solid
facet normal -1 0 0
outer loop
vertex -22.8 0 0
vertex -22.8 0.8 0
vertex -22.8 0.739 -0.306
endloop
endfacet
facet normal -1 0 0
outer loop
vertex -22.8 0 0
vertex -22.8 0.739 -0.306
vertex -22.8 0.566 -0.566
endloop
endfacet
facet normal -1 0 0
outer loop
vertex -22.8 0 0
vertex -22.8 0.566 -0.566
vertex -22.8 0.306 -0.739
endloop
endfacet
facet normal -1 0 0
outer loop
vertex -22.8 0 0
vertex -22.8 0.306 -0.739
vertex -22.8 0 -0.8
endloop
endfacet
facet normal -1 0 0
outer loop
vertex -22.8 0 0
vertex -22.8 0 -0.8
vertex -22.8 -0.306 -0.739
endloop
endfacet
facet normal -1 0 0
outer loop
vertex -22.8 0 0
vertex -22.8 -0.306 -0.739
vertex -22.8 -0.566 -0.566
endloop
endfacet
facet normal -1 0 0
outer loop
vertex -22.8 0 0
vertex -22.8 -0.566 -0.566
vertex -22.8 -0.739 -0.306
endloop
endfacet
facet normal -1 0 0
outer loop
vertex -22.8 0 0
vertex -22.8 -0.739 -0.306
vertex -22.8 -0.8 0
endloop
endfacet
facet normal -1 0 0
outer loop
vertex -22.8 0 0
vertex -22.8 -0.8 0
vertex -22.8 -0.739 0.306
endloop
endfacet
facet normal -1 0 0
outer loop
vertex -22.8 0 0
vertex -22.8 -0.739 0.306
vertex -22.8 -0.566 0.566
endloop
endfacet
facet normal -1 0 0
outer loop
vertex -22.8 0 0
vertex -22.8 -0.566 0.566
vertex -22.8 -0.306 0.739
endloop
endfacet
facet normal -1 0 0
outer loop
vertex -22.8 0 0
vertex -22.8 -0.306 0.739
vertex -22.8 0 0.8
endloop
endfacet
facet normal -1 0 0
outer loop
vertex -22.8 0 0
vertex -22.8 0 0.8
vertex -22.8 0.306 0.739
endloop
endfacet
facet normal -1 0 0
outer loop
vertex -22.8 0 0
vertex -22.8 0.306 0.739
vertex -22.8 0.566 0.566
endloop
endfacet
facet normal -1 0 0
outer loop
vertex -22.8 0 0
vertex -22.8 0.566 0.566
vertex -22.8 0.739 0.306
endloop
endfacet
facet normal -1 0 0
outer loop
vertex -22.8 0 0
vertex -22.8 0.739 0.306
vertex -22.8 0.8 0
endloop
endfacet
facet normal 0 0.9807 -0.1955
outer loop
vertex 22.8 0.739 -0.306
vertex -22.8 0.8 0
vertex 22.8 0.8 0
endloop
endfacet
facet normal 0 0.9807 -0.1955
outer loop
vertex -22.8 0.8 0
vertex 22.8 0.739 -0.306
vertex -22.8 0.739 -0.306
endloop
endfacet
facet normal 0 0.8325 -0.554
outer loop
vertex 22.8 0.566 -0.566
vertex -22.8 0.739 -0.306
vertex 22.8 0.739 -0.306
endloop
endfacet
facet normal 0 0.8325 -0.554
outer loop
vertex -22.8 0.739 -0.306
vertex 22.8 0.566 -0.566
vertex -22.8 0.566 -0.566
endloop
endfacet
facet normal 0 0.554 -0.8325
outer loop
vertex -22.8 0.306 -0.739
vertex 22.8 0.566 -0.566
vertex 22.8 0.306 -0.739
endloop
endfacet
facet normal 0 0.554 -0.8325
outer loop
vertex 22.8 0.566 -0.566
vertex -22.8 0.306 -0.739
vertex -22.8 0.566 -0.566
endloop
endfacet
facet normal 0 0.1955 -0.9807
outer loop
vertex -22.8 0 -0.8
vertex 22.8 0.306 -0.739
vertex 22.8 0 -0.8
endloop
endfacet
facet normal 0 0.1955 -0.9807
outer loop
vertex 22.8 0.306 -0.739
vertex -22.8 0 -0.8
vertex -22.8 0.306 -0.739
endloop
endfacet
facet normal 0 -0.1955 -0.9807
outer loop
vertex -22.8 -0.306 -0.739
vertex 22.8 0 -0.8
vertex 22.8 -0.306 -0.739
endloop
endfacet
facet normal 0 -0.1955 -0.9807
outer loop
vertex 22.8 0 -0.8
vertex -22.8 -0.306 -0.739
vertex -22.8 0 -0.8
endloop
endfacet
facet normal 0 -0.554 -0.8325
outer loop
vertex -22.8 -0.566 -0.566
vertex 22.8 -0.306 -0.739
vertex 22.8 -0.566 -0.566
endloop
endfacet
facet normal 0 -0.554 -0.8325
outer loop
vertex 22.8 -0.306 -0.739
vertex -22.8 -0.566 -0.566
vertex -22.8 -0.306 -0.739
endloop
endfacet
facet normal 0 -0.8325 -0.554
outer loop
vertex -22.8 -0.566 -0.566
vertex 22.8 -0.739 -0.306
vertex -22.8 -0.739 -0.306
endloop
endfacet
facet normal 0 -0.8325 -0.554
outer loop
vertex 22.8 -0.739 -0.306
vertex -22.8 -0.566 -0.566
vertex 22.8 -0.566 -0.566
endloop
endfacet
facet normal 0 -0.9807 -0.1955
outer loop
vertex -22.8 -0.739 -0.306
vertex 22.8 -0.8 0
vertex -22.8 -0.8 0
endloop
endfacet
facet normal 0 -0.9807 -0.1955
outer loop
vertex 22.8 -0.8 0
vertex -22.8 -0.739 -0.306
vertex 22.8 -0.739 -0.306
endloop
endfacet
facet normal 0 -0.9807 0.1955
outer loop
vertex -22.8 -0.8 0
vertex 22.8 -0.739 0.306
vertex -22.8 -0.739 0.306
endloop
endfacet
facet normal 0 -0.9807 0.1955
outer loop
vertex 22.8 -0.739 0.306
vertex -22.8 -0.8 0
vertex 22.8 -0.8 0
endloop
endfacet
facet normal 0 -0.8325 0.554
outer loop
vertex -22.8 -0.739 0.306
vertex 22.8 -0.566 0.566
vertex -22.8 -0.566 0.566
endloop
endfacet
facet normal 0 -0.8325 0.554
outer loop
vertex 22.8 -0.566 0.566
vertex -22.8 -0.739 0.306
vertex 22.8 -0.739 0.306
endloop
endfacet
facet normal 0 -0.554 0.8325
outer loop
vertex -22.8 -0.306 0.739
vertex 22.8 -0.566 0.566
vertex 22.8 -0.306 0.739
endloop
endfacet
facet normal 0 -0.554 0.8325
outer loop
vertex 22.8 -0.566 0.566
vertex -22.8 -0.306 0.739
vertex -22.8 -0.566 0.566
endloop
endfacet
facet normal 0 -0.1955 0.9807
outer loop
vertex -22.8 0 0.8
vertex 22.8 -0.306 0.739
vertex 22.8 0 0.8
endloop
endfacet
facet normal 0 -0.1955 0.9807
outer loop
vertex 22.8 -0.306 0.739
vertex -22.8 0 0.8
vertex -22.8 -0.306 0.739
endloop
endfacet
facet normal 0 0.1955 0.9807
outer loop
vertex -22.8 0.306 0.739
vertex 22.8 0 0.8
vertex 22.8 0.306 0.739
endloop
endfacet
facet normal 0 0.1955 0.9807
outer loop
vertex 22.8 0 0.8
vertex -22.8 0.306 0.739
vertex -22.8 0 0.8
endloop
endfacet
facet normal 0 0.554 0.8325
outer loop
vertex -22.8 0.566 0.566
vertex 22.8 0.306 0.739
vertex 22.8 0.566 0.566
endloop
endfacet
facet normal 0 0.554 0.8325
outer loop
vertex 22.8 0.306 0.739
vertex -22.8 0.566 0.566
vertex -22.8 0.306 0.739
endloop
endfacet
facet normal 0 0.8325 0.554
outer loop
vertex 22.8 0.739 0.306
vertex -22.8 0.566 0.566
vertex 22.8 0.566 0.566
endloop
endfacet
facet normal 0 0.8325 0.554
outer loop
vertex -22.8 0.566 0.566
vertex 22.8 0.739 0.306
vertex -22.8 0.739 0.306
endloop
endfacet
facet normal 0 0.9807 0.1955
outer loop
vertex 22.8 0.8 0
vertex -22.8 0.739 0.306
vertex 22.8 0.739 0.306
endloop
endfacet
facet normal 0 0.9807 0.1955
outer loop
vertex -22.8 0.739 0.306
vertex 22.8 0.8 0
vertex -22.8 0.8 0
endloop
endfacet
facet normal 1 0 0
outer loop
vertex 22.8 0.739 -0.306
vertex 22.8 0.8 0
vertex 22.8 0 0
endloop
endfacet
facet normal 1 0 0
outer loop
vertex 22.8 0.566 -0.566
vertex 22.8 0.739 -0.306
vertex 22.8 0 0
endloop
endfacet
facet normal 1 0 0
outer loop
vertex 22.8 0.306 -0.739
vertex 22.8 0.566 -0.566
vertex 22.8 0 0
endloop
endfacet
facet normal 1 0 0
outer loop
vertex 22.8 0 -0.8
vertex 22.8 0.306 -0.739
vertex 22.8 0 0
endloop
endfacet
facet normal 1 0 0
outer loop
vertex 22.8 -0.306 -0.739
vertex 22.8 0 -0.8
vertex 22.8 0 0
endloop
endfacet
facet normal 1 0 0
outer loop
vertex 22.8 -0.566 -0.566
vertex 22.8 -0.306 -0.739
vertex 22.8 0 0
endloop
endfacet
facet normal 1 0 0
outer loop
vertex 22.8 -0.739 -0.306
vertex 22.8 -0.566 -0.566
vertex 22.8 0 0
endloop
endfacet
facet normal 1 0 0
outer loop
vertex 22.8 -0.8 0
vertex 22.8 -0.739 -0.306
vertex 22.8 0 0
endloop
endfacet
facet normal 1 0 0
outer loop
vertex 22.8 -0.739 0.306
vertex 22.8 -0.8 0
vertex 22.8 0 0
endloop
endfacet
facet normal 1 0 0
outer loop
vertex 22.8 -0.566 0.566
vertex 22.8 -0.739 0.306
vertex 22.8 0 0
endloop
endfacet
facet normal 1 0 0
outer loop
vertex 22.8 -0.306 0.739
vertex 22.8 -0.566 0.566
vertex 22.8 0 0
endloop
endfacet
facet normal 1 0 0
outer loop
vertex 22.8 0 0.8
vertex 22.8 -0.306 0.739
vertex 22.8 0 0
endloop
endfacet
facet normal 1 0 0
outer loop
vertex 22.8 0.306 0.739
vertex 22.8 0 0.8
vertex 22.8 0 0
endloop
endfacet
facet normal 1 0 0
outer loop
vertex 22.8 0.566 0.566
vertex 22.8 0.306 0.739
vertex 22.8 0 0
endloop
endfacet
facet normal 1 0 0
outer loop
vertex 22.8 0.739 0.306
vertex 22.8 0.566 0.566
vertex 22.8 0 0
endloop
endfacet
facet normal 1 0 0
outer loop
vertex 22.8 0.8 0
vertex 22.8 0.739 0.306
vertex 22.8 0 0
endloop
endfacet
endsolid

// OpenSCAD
// file: ../p/4-4edge.scad
use <../lib.scad>
function ldraw_lib__4_4edge() = [
// 0 Circle 1.0
// 0 Name: 4-4edge.dat
// 0 Author: James Jessiman
// 0 !LDRAW_ORG Primitive UPDATE 2017-01
// 0 !LICENSE Licensed under CC BY 2.0 and CC BY 4.0 : see CAreadme.txt
// 
// 0 BFC CERTIFY CCW
  [0,"BFC","CERTIFY"],
  [0,"BFC","CCW"],
// 
// 0 !HISTORY 1998-12-15 [PTadmin] Official Update 1998-10
// 0 !HISTORY 2005-12-28 [PTadmin] Official Update 2005-01
// 0 !HISTORY 2007-06-24 [PTadmin] Header formatted for Contributor Agreement
// 0 !HISTORY 2008-07-01 [PTadmin] Official Update 2008-01
// 0 !HISTORY 2017-01-15 [Steffen] BFCed
// 0 !HISTORY 2017-12-30 [PTadmin] Official Update 2017-01
// 
// 
// 2 24 1 0 0 0.9239 0 0.3827
  [2,24,1,0,0,0.9239,0,0.3827],
// 2 24 0.9239 0 0.3827 0.7071 0 0.7071
  [2,24,0.9239,0,0.3827,0.7071,0,0.7071],
// 2 24 0.7071 0 0.7071 0.3827 0 0.9239
  [2,24,0.7071,0,0.7071,0.3827,0,0.9239],
// 2 24 0.3827 0 0.9239 0 0 1
  [2,24,0.3827,0,0.9239,0,0,1],
// 2 24 0 0 1 -0.3827 0 0.9239
  [2,24,0,0,1,-0.3827,0,0.9239],
// 2 24 -0.3827 0 0.9239 -0.7071 0 0.7071
  [2,24,-0.3827,0,0.9239,-0.7071,0,0.7071],
// 2 24 -0.7071 0 0.7071 -0.9239 0 0.3827
  [2,24,-0.7071,0,0.7071,-0.9239,0,0.3827],
// 2 24 -0.9239 0 0.3827 -1 0 -0
  [2,24,-0.9239,0,0.3827,-1,0,-0],
// 2 24 -1 0 -0 -0.9239 0 -0.3827
  [2,24,-1,0,-0,-0.9239,0,-0.3827],
// 2 24 -0.9239 0 -0.3827 -0.7071 0 -0.7071
  [2,24,-0.9239,0,-0.3827,-0.7071,0,-0.7071],
// 2 24 -0.7071 0 -0.7071 -0.3827 0 -0.9239
  [2,24,-0.7071,0,-0.7071,-0.3827,0,-0.9239],
// 2 24 -0.3827 0 -0.9239 0 0 -1
  [2,24,-0.3827,0,-0.9239,0,0,-1],
// 2 24 0 0 -1 0.3827 0 -0.9239
  [2,24,0,0,-1,0.3827,0,-0.9239],
// 2 24 0.3827 0 -0.9239 0.7071 0 -0.7071
  [2,24,0.3827,0,-0.9239,0.7071,0,-0.7071],
// 2 24 0.7071 0 -0.7071 0.9239 0 -0.3827
  [2,24,0.7071,0,-0.7071,0.9239,0,-0.3827],
// 2 24 0.9239 0 -0.3827 1 0 0
  [2,24,0.9239,0,-0.3827,1,0,0],
];
module ldraw_lib__4_4edge(step=0, col=false, unit=2/5, alt=false, line=0.2, solid=!$preview)
    makepoly(ldraw_lib__4_4edge(), step=step, col=col, unit=unit, alt=alt, line=line, solid=solid);
ldraw_lib__4_4edge(line=0.2);
// file: ../p/4-4cyli.scad
use <../lib.scad>
function ldraw_lib__4_4cyli() = [
// 0 Cylinder 1.0
// 0 Name: 4-4cyli.dat
// 0 Author: James Jessiman
// 0 !LDRAW_ORG Primitive UPDATE 2005-01
// 0 !LICENSE Licensed under CC BY 2.0 and CC BY 4.0 : see CAreadme.txt
// 
// 0 BFC CERTIFY CCW
  [0,"BFC","CERTIFY"],
  [0,"BFC","CCW"],
// 
// 0 !HISTORY 1998-12-15 [PTadmin] Official Update 1998-10
// 0 !HISTORY 2002-03-23 [sbliss] Added BFC statement; merged headers from files in distributions LDraw 0.27 and Complete.
// 0 !HISTORY 2002-04-25 [PTadmin] Official Update 2002-02
// 0 !HISTORY 2004-12-14 [guyvivan] BFC CCW
// 0 !HISTORY 2005-12-28 [PTadmin] Official Update 2005-01
// 0 !HISTORY 2007-06-24 [PTadmin] Header formatted for Contributor Agreement
// 0 !HISTORY 2008-07-01 [PTadmin] Official Update 2008-01
// 
// 
// 4 16 1 1 0 0.9239 1 0.3827 0.9239 0 0.3827 1 0 0
  [4,16,1,1,0,0.9239,1,0.3827,0.9239,0,0.3827,1,0,0],
// 5 24 1 0 0 1 1 0 0.9239 0 0.3827 0.9239 0 -0.3827
  [5,24,1,0,0,1,1,0,0.9239,0,0.3827,0.9239,0,-0.3827],
// 4 16 0.9239 1 0.3827 0.7071 1 0.7071 0.7071 0 0.7071 0.9239 0 0.3827
  [4,16,0.9239,1,0.3827,0.7071,1,0.7071,0.7071,0,0.7071,0.9239,0,0.3827],
// 5 24 0.9239 0 0.3827 0.9239 1 0.3827 0.7071 0 0.7071 1 0 0
  [5,24,0.9239,0,0.3827,0.9239,1,0.3827,0.7071,0,0.7071,1,0,0],
// 4 16 0.7071 1 0.7071 0.3827 1 0.9239 0.3827 0 0.9239 0.7071 0 0.7071
  [4,16,0.7071,1,0.7071,0.3827,1,0.9239,0.3827,0,0.9239,0.7071,0,0.7071],
// 5 24 0.7071 0 0.7071 0.7071 1 0.7071 0.3827 0 0.9239 0.9239 0 0.3827
  [5,24,0.7071,0,0.7071,0.7071,1,0.7071,0.3827,0,0.9239,0.9239,0,0.3827],
// 4 16 0.3827 1 0.9239 0 1 1 0 0 1 0.3827 0 0.9239
  [4,16,0.3827,1,0.9239,0,1,1,0,0,1,0.3827,0,0.9239],
// 5 24 0.3827 0 0.9239 0.3827 1 0.9239 0 0 1 0.7071 0 0.7071
  [5,24,0.3827,0,0.9239,0.3827,1,0.9239,0,0,1,0.7071,0,0.7071],
// 4 16 0 1 1 -0.3827 1 0.9239 -0.3827 0 0.9239 0 0 1
  [4,16,0,1,1,-0.3827,1,0.9239,-0.3827,0,0.9239,0,0,1],
// 5 24 0 0 1 0 1 1 -0.3827 0 0.9239 0.3827 0 0.9239
  [5,24,0,0,1,0,1,1,-0.3827,0,0.9239,0.3827,0,0.9239],
// 4 16 -0.3827 1 0.9239 -0.7071 1 0.7071 -0.7071 0 0.7071 -0.3827 0 0.9239
  [4,16,-0.3827,1,0.9239,-0.7071,1,0.7071,-0.7071,0,0.7071,-0.3827,0,0.9239],
// 5 24 -0.3827 0 0.9239 -0.3827 1 0.9239 -0.7071 0 0.7071 0 0 1
  [5,24,-0.3827,0,0.9239,-0.3827,1,0.9239,-0.7071,0,0.7071,0,0,1],
// 4 16 -0.7071 1 0.7071 -0.9239 1 0.3827 -0.9239 0 0.3827 -0.7071 0 0.7071
  [4,16,-0.7071,1,0.7071,-0.9239,1,0.3827,-0.9239,0,0.3827,-0.7071,0,0.7071],
// 5 24 -0.7071 0 0.7071 -0.7071 1 0.7071 -0.9239 0 0.3827 -0.3827 0 0.9239
  [5,24,-0.7071,0,0.7071,-0.7071,1,0.7071,-0.9239,0,0.3827,-0.3827,0,0.9239],
// 4 16 -0.9239 1 0.3827 -1 1 0 -1 0 0 -0.9239 0 0.3827
  [4,16,-0.9239,1,0.3827,-1,1,0,-1,0,0,-0.9239,0,0.3827],
// 5 24 -0.9239 0 0.3827 -0.9239 1 0.3827 -1 0 0 -0.7071 0 0.7071
  [5,24,-0.9239,0,0.3827,-0.9239,1,0.3827,-1,0,0,-0.7071,0,0.7071],
// 4 16 -1 1 0 -0.9239 1 -0.3827 -0.9239 0 -0.3827 -1 0 0
  [4,16,-1,1,0,-0.9239,1,-0.3827,-0.9239,0,-0.3827,-1,0,0],
// 5 24 -1 0 0 -1 1 0 -0.9239 0 -0.3827 -0.9239 0 0.3827
  [5,24,-1,0,0,-1,1,0,-0.9239,0,-0.3827,-0.9239,0,0.3827],
// 4 16 -0.9239 1 -0.3827 -0.7071 1 -0.7071 -0.7071 0 -0.7071 -0.9239 0 -0.3827
  [4,16,-0.9239,1,-0.3827,-0.7071,1,-0.7071,-0.7071,0,-0.7071,-0.9239,0,-0.3827],
// 5 24 -0.9239 0 -0.3827 -0.9239 1 -0.3827 -0.7071 0 -0.7071 -1 0 0
  [5,24,-0.9239,0,-0.3827,-0.9239,1,-0.3827,-0.7071,0,-0.7071,-1,0,0],
// 4 16 -0.7071 1 -0.7071 -0.3827 1 -0.9239 -0.3827 0 -0.9239 -0.7071 0 -0.7071
  [4,16,-0.7071,1,-0.7071,-0.3827,1,-0.9239,-0.3827,0,-0.9239,-0.7071,0,-0.7071],
// 5 24 -0.7071 0 -0.7071 -0.7071 1 -0.7071 -0.3827 0 -0.9239 -0.9239 0 -0.3827
  [5,24,-0.7071,0,-0.7071,-0.7071,1,-0.7071,-0.3827,0,-0.9239,-0.9239,0,-0.3827],
// 4 16 -0.3827 1 -0.9239 0 1 -1 0 0 -1 -0.3827 0 -0.9239
  [4,16,-0.3827,1,-0.9239,0,1,-1,0,0,-1,-0.3827,0,-0.9239],
// 5 24 -0.3827 0 -0.9239 -0.3827 1 -0.9239 0 0 -1 -0.7071 0 -0.7071
  [5,24,-0.3827,0,-0.9239,-0.3827,1,-0.9239,0,0,-1,-0.7071,0,-0.7071],
// 4 16 0 1 -1 0.3827 1 -0.9239 0.3827 0 -0.9239 0 0 -1
  [4,16,0,1,-1,0.3827,1,-0.9239,0.3827,0,-0.9239,0,0,-1],
// 5 24 0 0 -1 0 1 -1 0.3827 0 -0.9239 -0.3827 0 -0.9239
  [5,24,0,0,-1,0,1,-1,0.3827,0,-0.9239,-0.3827,0,-0.9239],
// 4 16 0.3827 1 -0.9239 0.7071 1 -0.7071 0.7071 0 -0.7071 0.3827 0 -0.9239
  [4,16,0.3827,1,-0.9239,0.7071,1,-0.7071,0.7071,0,-0.7071,0.3827,0,-0.9239],
// 5 24 0.3827 0 -0.9239 0.3827 1 -0.9239 0.7071 0 -0.7071 0 0 -1
  [5,24,0.3827,0,-0.9239,0.3827,1,-0.9239,0.7071,0,-0.7071,0,0,-1],
// 4 16 0.7071 1 -0.7071 0.9239 1 -0.3827 0.9239 0 -0.3827 0.7071 0 -0.7071
  [4,16,0.7071,1,-0.7071,0.9239,1,-0.3827,0.9239,0,-0.3827,0.7071,0,-0.7071],
// 5 24 0.7071 0 -0.7071 0.7071 1 -0.7071 0.9239 0 -0.3827 0.3827 0 -0.9239
  [5,24,0.7071,0,-0.7071,0.7071,1,-0.7071,0.9239,0,-0.3827,0.3827,0,-0.9239],
// 4 16 0.9239 1 -0.3827 1 1 0 1 0 0 0.9239 0 -0.3827
  [4,16,0.9239,1,-0.3827,1,1,0,1,0,0,0.9239,0,-0.3827],
// 5 24 0.9239 0 -0.3827 0.9239 1 -0.3827 1 0 0 0.7071 0 -0.7071
  [5,24,0.9239,0,-0.3827,0.9239,1,-0.3827,1,0,0,0.7071,0,-0.7071],
// 0
];
module ldraw_lib__4_4cyli(step=0, col=false, unit=2/5, alt=false, line=0.2, solid=!$preview)
    makepoly(ldraw_lib__4_4cyli(), step=step, col=col, unit=unit, alt=alt, line=line, solid=solid);
ldraw_lib__4_4cyli(line=0.2);
// file: ../p/4-4disc.scad
use <../lib.scad>
function ldraw_lib__4_4disc() = [
// 0 Disc 1.0
// 0 Name: 4-4disc.dat
// 0 Author: James Jessiman
// 0 !LDRAW_ORG Primitive UPDATE 2002-02
// 0 !LICENSE Licensed under CC BY 2.0 and CC BY 4.0 : see CAreadme.txt
// 
// 0 BFC CERTIFY CCW
  [0,"BFC","CERTIFY"],
  [0,"BFC","CCW"],
// 
// 0 !HISTORY 1998-12-15 [PTadmin] Official Update 1998-10
// 0 !HISTORY 2002-03-23 [sbliss] Added BFC statement
// 0 !HISTORY 2002-04-25 [PTadmin] Official Update 2002-02
// 0 !HISTORY 2007-06-24 [PTadmin] Header formatted for Contributor Agreement
// 0 !HISTORY 2008-07-01 [PTadmin] Official Update 2008-01
// 
// 
// 3 16 0 0 0 1 0 0 0.9239 0 0.3827
  [3,16,0,0,0,1,0,0,0.9239,0,0.3827],
// 3 16 0 0 0 0.9239 0 0.3827 0.7071 0 0.7071
  [3,16,0,0,0,0.9239,0,0.3827,0.7071,0,0.7071],
// 3 16 0 0 0 0.7071 0 0.7071 0.3827 0 0.9239
  [3,16,0,0,0,0.7071,0,0.7071,0.3827,0,0.9239],
// 3 16 0 0 0 0.3827 0 0.9239 0 0 1
  [3,16,0,0,0,0.3827,0,0.9239,0,0,1],
// 3 16 0 0 0 0 0 1 -0.3827 0 0.9239
  [3,16,0,0,0,0,0,1,-0.3827,0,0.9239],
// 3 16 0 0 0 -0.3827 0 0.9239 -0.7071 0 0.7071
  [3,16,0,0,0,-0.3827,0,0.9239,-0.7071,0,0.7071],
// 3 16 0 0 0 -0.7071 0 0.7071 -0.9239 0 0.3827
  [3,16,0,0,0,-0.7071,0,0.7071,-0.9239,0,0.3827],
// 3 16 0 0 0 -0.9239 0 0.3827 -1 0 -0
  [3,16,0,0,0,-0.9239,0,0.3827,-1,0,-0],
// 3 16 0 0 0 -1 0 -0 -0.9239 0 -0.3827
  [3,16,0,0,0,-1,0,-0,-0.9239,0,-0.3827],
// 3 16 0 0 0 -0.9239 0 -0.3827 -0.7071 0 -0.7071
  [3,16,0,0,0,-0.9239,0,-0.3827,-0.7071,0,-0.7071],
// 3 16 0 0 0 -0.7071 0 -0.7071 -0.3827 0 -0.9239
  [3,16,0,0,0,-0.7071,0,-0.7071,-0.3827,0,-0.9239],
// 3 16 0 0 0 -0.3827 0 -0.9239 0 0 -1
  [3,16,0,0,0,-0.3827,0,-0.9239,0,0,-1],
// 3 16 0 0 0 0 0 -1 0.3827 0 -0.9239
  [3,16,0,0,0,0,0,-1,0.3827,0,-0.9239],
// 3 16 0 0 0 0.3827 0 -0.9239 0.7071 0 -0.7071
  [3,16,0,0,0,0.3827,0,-0.9239,0.7071,0,-0.7071],
// 3 16 0 0 0 0.7071 0 -0.7071 0.9239 0 -0.3827
  [3,16,0,0,0,0.7071,0,-0.7071,0.9239,0,-0.3827],
// 3 16 0 0 0 0.9239 0 -0.3827 1 0 0
  [3,16,0,0,0,0.9239,0,-0.3827,1,0,0],
// 0
];
module ldraw_lib__4_4disc(step=0, col=false, unit=2/5, alt=false, line=0.2, solid=!$preview)
    makepoly(ldraw_lib__4_4disc(), step=step, col=col, unit=unit, alt=alt, line=line, solid=solid);
ldraw_lib__4_4disc(line=0.2);
// file: ../p/4-4cylc.scad
use <../lib.scad>
use <4-4cyli.scad>
use <4-4disc.scad>
use <4-4edge.scad>
function ldraw_lib__4_4cylc() = [
// 0 Cylinder Closed 1.0
// 0 Name: 4-4cylc.dat
// 0 Author: Alex Taylor [anathema]
// 0 !LDRAW_ORG Primitive UPDATE 2009-02
// 0 !LICENSE Licensed under CC BY 2.0 and CC BY 4.0 : see CAreadme.txt
// 
// 0 BFC CERTIFY CCW
  [0,"BFC","CERTIFY"],
  [0,"BFC","CCW"],
// 
// 0 !HISTORY 2008-12-29 [cwdee] Removed one disc
// 0 !HISTORY 2009-09-03 [PTadmin] Official Update 2009-02
// 
// 
// 1 16 0 0 0 1 0 0 0 1 0 0 0 1 4-4edge.dat
  [1,16,0,0,0,1,0,0,0,1,0,0,0,1, ldraw_lib__4_4edge()],
// 1 16 0 1 0 1 0 0 0 1 0 0 0 1 4-4edge.dat
  [1,16,0,1,0,1,0,0,0,1,0,0,0,1, ldraw_lib__4_4edge()],
// 1 16 0 0 0 1 0 0 0 1 0 0 0 1 4-4disc.dat
  [1,16,0,0,0,1,0,0,0,1,0,0,0,1, ldraw_lib__4_4disc()],
// 1 16 0 0 0 1 0 0 0 1 0 0 0 1 4-4cyli.dat
  [1,16,0,0,0,1,0,0,0,1,0,0,0,1, ldraw_lib__4_4cyli()],
// 0
];
module ldraw_lib__4_4cylc(step=0, col=false, unit=2/5, alt=false, line=0.2, solid=!$preview)
    makepoly(ldraw_lib__4_4cylc(), step=step, col=col, unit=unit, alt=alt, line=line, solid=solid);
ldraw_lib__4_4cylc(line=0.2);
// main file
use <../lib.scad>
use <../p/4-4cylc.scad>
use <../p/4-4disc.scad>
function ldraw_lib__u9133() = [
// 0 ~Axle Steel  4 x 114 LDU
// 0 Name: u9133.dat
// 0 Author: Steffen [Steffen]
// 0 !LDRAW_ORG Part UPDATE 2011-02
// 0 !LICENSE Licensed under CC BY 2.0 and CC BY 4.0 : see CAreadme.txt
// 
// 0 BFC CERTIFY CCW
  [0,"BFC","CERTIFY"],
  [0,"BFC","CCW"],
// 
// 0 !CATEGORY Wheel
// 
// 0 !HISTORY 2011-12-29 [PTadmin] Official Update 2011-02
// 
// 
// 1 16 -57 0 0 0 114 0 0 0 2 2 0 0 4-4cylc.dat
  [1,16,-57,0,0,0,114,0,0,0,2,2,0,0, ldraw_lib__4_4cylc()],
// 1 16 57 0 0 0 -1 0 0 0 2 2 0 0 4-4disc.dat
  [1,16,57,0,0,0,-1,0,0,0,2,2,0,0, ldraw_lib__4_4disc()],
];
module ldraw_lib__u9133(step=0, col=false, unit=2/5, alt=false, line=0.2, solid=!$preview)
    makepoly(ldraw_lib__u9133(), step=step, col=col, unit=unit, alt=alt, line=line, solid=solid);
ldraw_lib__u9133(line=0.2);
